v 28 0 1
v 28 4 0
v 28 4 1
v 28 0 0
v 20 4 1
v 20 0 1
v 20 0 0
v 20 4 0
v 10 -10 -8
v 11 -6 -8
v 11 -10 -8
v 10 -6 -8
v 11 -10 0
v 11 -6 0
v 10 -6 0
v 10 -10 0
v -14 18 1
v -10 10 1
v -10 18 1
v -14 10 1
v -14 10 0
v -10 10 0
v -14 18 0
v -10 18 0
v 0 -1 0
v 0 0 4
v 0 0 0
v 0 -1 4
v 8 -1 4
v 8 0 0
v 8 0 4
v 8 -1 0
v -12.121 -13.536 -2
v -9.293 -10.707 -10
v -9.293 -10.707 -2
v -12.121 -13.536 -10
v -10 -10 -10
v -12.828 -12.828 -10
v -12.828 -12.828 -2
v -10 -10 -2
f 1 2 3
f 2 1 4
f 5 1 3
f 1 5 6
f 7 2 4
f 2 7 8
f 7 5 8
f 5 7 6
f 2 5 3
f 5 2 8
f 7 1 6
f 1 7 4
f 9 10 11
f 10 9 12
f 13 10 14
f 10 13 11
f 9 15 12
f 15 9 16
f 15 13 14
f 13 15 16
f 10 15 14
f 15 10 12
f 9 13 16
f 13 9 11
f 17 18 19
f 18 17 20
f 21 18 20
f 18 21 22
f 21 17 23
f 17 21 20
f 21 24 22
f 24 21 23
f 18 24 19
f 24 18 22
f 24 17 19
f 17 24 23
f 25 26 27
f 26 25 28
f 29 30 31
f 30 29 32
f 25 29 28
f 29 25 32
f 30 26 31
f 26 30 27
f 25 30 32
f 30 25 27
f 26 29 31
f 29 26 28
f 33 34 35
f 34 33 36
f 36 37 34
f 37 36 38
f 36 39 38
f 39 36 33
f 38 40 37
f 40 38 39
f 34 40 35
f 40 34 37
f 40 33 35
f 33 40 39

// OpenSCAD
// Copyright Stephen Morrisson 2018
// All rights reserved

module aBlock(c, xS, yS, zS)
{
    color(c)
        cube([xS, yS, zS]);
}


module tBlock(c, xO, yO, zO, xS, yS, zS)
{
    translate([xO, yO, zO])
        aBlock(c, xS, yS, zS);
}

module rBlock(c, rX, rY, rZ, xS, yS, zS)
{
    rotate([rX, rY, rZ])
        aBlock(c, xS, yS, zS);
}

module trBlock(c, xO, yO, zO, rX, rY, rZ, xS, yS, zS)
{
    color(c)
    translate([xO, yO, zO])
       rBlock(c, rX, rY, rZ, xS, yS, zS);
}

//aBlock("yellow", 1,2,3);
//tBlock("red", 10, 10, 10, 1, 2,3);
trBlock("orange", 20,0,0,  0,0,0, 8,4,1);
trBlock("blue", 10, -10, 0, 0, 90, 0, 8, 4, 1);
trBlock("gray", -10, 10, 0, 0,0,90, 8,4,1);
trBlock("yellow", 0,0,0, 90,0,0, 8,4,1);
trBlock("green", -10,-10,-10, 90,270,45, 8,4,1);
